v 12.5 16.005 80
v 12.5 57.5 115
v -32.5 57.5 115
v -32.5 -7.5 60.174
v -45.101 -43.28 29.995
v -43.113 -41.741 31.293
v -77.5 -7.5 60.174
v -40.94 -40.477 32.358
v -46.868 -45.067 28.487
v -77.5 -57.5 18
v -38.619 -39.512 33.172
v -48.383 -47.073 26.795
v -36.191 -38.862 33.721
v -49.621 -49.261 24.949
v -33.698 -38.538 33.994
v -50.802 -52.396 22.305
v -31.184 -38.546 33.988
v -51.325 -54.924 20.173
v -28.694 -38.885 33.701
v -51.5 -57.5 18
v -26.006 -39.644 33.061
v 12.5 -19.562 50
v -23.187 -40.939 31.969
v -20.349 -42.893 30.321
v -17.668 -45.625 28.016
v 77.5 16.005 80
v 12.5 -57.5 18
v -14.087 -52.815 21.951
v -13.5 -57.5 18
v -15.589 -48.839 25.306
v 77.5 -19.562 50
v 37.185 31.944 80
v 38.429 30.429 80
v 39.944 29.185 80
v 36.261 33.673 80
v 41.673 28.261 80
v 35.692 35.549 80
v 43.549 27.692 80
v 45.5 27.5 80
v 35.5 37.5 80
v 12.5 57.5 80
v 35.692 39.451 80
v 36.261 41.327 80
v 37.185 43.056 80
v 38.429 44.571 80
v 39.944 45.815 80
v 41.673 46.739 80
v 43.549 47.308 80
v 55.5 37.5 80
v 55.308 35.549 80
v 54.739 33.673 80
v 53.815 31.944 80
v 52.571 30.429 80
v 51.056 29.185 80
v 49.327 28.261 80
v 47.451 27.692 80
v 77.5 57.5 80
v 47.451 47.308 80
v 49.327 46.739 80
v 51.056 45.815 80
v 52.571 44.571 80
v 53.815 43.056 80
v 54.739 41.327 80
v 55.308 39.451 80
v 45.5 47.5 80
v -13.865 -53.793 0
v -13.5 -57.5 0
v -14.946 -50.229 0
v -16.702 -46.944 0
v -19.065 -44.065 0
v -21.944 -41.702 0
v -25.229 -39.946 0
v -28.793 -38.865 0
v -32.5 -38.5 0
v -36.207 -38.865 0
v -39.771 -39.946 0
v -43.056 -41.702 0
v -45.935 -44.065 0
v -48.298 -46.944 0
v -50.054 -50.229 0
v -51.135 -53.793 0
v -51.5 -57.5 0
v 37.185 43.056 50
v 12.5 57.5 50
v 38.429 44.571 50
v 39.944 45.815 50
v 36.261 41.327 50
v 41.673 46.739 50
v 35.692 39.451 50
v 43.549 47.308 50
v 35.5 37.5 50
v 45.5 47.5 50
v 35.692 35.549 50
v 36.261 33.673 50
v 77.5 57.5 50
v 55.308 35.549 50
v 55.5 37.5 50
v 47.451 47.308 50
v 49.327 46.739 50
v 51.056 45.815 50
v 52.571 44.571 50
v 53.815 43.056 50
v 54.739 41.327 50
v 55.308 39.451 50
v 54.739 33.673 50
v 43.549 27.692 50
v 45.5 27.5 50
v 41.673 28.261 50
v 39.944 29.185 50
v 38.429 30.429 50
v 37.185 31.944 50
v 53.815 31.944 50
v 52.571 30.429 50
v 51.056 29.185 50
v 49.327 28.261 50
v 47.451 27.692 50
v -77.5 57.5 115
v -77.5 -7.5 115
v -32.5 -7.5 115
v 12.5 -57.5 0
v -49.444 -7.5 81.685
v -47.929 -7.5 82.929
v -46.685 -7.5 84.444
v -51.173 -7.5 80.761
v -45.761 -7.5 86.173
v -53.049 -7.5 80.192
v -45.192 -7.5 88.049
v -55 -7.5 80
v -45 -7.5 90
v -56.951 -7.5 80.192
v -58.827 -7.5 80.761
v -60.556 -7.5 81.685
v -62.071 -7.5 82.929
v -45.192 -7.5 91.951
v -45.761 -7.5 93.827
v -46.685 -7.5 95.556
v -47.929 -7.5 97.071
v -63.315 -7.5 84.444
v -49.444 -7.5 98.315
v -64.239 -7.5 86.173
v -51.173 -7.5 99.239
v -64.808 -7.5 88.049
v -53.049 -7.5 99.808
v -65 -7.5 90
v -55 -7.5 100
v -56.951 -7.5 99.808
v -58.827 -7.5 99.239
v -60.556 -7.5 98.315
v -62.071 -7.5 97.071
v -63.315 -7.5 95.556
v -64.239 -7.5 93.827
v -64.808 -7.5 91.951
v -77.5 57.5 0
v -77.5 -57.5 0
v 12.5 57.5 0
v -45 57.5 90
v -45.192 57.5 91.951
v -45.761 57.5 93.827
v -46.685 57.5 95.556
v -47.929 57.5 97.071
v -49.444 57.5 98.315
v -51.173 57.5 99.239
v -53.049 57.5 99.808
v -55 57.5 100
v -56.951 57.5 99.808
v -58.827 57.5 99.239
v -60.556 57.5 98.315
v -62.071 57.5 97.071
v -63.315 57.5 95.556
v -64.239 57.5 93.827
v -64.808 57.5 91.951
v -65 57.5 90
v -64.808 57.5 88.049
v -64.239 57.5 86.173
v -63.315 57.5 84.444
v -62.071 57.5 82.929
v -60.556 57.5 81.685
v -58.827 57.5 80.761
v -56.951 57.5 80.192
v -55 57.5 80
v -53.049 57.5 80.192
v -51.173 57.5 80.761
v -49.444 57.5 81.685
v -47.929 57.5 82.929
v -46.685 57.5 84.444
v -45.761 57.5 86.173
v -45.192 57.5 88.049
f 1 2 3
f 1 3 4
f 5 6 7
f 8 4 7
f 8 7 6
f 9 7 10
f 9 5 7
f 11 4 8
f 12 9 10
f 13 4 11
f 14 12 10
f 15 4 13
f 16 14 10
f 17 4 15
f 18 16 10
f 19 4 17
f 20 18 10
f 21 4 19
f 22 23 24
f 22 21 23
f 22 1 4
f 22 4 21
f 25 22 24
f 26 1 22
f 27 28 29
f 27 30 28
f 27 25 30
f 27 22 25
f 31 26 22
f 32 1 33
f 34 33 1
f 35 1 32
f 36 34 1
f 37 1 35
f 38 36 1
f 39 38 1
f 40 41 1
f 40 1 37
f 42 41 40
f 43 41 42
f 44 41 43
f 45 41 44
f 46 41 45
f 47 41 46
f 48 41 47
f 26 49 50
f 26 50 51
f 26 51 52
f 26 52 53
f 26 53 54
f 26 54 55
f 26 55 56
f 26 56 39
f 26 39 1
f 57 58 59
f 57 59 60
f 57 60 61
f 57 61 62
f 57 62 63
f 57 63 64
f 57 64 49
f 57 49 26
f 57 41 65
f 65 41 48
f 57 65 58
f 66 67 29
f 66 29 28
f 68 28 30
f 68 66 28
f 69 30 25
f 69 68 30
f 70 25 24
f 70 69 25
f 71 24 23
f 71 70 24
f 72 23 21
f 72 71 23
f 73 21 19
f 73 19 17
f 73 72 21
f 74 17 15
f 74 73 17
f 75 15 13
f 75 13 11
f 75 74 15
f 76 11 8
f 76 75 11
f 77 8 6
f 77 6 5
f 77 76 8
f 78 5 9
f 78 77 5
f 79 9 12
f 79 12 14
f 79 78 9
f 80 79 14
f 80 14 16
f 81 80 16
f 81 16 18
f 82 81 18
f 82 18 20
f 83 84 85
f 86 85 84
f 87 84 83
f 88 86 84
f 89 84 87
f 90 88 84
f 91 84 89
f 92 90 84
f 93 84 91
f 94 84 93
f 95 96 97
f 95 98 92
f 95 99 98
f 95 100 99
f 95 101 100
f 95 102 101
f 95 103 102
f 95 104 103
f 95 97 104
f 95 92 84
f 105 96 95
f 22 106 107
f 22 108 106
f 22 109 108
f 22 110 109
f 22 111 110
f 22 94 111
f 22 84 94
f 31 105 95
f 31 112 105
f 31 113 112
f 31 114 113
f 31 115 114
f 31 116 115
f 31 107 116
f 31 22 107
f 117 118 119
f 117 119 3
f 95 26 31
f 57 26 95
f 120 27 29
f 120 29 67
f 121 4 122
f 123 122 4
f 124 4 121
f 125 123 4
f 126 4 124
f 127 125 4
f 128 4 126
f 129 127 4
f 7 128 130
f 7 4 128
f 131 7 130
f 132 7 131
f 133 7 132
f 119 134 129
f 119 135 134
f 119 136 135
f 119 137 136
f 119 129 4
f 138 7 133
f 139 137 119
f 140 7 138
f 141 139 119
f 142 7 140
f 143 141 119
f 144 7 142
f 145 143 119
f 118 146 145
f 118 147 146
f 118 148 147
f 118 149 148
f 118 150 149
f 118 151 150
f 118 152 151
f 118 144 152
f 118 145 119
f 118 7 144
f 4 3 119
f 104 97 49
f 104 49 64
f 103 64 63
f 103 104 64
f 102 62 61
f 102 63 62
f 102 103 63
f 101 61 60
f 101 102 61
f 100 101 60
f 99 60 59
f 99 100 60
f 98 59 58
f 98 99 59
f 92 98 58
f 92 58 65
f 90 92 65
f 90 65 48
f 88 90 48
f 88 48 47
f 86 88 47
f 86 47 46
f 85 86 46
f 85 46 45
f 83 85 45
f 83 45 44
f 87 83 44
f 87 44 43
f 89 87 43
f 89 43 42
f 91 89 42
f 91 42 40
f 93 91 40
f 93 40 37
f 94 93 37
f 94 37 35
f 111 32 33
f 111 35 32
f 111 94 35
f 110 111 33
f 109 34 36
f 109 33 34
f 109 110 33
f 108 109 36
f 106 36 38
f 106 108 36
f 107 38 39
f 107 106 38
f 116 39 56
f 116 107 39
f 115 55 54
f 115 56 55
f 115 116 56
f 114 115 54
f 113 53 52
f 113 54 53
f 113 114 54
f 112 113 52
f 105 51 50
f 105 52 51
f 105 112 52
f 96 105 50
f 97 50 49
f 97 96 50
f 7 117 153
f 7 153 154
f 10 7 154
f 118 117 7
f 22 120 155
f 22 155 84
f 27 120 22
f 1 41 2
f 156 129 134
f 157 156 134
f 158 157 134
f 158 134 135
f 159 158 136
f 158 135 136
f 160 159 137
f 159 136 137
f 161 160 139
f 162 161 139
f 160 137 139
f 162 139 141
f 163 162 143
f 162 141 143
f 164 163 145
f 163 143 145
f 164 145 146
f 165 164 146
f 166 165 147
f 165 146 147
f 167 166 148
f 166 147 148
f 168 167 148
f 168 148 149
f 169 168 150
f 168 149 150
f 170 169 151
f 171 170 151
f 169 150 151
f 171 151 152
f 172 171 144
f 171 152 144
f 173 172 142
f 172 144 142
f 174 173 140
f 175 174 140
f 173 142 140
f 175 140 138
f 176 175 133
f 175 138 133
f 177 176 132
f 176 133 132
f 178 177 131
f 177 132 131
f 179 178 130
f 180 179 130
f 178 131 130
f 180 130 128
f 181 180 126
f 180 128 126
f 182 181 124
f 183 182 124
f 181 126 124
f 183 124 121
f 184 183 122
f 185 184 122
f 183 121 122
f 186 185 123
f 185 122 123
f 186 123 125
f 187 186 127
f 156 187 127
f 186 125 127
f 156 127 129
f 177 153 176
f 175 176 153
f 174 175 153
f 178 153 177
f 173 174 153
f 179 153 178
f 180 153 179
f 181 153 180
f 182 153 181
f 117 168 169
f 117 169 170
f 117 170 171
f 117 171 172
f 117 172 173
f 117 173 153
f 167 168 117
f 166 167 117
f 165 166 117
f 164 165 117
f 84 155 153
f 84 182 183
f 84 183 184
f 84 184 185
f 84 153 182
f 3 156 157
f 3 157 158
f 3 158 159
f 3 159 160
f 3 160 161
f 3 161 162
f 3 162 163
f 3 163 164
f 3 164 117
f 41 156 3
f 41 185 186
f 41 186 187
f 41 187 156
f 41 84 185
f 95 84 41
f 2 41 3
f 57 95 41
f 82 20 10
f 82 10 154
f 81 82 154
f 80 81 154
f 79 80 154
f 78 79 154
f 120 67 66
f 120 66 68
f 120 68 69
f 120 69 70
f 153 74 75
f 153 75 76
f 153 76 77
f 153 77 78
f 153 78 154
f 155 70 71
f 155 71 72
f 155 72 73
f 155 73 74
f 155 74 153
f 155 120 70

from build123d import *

# Parameters (mm, degrees)
F1_DEPTH = 77.5
F2_W     = 65
F2_H     = 35
F2_H_2   = 50
F3_DEPTH = 100
F4_R     = 19
F4_R_2   = 10
F5_DEPTH = 160.94138
F7_DEPTH = 45
F8_R     = 10
F9_DEPTH = 65


with BuildPart() as f1:
    # F0 (on Right) → F1 (new body, symmetric)
    with BuildSketch(Plane.YZ):
        Polygon((-57.5, 0), (57.5, 0), (57.5, 115), (-57.5, 18), align=None)
    extrude(amount=F1_DEPTH, both=True)

    # F2 (on Front) → F3 (cut, symmetric)
    with BuildSketch(Plane.XZ):
        with Locations((45, 97.5)):
            Rectangle(F2_W, F2_H)
        with Locations((45, 25)):
            Rectangle(F2_W, F2_H_2)
    extrude(amount=F3_DEPTH, both=True, mode=Mode.SUBTRACT)

    # F4 (on Top) → F5 (cut)
    with BuildSketch(Plane.XY):
        with Locations((-32.5, -57.5)):
            Circle(F4_R)
        with Locations((45.5, 37.5)):
            Circle(F4_R_2)
    extrude(amount=F5_DEPTH, mode=Mode.SUBTRACT)

    # F6 (on face) → F7 (join)
    with BuildSketch(Plane(origin=(-77.5, 0, 0), x_dir=(0, -1, 0), z_dir=(-1, 0, 0))):
        Polygon((7.5, 115), (-57.5, 115), (7.5, 60.1739130435), align=None)
    extrude(amount=-F7_DEPTH)

    # F8 (on face) → F9 (cut, through all)
    with BuildSketch(Plane.XZ.offset(7.5)):
        with Locations((-55, 90)):
            Circle(F8_R)
    extrude(amount=-F9_DEPTH, mode=Mode.SUBTRACT)


solid = f1.part
